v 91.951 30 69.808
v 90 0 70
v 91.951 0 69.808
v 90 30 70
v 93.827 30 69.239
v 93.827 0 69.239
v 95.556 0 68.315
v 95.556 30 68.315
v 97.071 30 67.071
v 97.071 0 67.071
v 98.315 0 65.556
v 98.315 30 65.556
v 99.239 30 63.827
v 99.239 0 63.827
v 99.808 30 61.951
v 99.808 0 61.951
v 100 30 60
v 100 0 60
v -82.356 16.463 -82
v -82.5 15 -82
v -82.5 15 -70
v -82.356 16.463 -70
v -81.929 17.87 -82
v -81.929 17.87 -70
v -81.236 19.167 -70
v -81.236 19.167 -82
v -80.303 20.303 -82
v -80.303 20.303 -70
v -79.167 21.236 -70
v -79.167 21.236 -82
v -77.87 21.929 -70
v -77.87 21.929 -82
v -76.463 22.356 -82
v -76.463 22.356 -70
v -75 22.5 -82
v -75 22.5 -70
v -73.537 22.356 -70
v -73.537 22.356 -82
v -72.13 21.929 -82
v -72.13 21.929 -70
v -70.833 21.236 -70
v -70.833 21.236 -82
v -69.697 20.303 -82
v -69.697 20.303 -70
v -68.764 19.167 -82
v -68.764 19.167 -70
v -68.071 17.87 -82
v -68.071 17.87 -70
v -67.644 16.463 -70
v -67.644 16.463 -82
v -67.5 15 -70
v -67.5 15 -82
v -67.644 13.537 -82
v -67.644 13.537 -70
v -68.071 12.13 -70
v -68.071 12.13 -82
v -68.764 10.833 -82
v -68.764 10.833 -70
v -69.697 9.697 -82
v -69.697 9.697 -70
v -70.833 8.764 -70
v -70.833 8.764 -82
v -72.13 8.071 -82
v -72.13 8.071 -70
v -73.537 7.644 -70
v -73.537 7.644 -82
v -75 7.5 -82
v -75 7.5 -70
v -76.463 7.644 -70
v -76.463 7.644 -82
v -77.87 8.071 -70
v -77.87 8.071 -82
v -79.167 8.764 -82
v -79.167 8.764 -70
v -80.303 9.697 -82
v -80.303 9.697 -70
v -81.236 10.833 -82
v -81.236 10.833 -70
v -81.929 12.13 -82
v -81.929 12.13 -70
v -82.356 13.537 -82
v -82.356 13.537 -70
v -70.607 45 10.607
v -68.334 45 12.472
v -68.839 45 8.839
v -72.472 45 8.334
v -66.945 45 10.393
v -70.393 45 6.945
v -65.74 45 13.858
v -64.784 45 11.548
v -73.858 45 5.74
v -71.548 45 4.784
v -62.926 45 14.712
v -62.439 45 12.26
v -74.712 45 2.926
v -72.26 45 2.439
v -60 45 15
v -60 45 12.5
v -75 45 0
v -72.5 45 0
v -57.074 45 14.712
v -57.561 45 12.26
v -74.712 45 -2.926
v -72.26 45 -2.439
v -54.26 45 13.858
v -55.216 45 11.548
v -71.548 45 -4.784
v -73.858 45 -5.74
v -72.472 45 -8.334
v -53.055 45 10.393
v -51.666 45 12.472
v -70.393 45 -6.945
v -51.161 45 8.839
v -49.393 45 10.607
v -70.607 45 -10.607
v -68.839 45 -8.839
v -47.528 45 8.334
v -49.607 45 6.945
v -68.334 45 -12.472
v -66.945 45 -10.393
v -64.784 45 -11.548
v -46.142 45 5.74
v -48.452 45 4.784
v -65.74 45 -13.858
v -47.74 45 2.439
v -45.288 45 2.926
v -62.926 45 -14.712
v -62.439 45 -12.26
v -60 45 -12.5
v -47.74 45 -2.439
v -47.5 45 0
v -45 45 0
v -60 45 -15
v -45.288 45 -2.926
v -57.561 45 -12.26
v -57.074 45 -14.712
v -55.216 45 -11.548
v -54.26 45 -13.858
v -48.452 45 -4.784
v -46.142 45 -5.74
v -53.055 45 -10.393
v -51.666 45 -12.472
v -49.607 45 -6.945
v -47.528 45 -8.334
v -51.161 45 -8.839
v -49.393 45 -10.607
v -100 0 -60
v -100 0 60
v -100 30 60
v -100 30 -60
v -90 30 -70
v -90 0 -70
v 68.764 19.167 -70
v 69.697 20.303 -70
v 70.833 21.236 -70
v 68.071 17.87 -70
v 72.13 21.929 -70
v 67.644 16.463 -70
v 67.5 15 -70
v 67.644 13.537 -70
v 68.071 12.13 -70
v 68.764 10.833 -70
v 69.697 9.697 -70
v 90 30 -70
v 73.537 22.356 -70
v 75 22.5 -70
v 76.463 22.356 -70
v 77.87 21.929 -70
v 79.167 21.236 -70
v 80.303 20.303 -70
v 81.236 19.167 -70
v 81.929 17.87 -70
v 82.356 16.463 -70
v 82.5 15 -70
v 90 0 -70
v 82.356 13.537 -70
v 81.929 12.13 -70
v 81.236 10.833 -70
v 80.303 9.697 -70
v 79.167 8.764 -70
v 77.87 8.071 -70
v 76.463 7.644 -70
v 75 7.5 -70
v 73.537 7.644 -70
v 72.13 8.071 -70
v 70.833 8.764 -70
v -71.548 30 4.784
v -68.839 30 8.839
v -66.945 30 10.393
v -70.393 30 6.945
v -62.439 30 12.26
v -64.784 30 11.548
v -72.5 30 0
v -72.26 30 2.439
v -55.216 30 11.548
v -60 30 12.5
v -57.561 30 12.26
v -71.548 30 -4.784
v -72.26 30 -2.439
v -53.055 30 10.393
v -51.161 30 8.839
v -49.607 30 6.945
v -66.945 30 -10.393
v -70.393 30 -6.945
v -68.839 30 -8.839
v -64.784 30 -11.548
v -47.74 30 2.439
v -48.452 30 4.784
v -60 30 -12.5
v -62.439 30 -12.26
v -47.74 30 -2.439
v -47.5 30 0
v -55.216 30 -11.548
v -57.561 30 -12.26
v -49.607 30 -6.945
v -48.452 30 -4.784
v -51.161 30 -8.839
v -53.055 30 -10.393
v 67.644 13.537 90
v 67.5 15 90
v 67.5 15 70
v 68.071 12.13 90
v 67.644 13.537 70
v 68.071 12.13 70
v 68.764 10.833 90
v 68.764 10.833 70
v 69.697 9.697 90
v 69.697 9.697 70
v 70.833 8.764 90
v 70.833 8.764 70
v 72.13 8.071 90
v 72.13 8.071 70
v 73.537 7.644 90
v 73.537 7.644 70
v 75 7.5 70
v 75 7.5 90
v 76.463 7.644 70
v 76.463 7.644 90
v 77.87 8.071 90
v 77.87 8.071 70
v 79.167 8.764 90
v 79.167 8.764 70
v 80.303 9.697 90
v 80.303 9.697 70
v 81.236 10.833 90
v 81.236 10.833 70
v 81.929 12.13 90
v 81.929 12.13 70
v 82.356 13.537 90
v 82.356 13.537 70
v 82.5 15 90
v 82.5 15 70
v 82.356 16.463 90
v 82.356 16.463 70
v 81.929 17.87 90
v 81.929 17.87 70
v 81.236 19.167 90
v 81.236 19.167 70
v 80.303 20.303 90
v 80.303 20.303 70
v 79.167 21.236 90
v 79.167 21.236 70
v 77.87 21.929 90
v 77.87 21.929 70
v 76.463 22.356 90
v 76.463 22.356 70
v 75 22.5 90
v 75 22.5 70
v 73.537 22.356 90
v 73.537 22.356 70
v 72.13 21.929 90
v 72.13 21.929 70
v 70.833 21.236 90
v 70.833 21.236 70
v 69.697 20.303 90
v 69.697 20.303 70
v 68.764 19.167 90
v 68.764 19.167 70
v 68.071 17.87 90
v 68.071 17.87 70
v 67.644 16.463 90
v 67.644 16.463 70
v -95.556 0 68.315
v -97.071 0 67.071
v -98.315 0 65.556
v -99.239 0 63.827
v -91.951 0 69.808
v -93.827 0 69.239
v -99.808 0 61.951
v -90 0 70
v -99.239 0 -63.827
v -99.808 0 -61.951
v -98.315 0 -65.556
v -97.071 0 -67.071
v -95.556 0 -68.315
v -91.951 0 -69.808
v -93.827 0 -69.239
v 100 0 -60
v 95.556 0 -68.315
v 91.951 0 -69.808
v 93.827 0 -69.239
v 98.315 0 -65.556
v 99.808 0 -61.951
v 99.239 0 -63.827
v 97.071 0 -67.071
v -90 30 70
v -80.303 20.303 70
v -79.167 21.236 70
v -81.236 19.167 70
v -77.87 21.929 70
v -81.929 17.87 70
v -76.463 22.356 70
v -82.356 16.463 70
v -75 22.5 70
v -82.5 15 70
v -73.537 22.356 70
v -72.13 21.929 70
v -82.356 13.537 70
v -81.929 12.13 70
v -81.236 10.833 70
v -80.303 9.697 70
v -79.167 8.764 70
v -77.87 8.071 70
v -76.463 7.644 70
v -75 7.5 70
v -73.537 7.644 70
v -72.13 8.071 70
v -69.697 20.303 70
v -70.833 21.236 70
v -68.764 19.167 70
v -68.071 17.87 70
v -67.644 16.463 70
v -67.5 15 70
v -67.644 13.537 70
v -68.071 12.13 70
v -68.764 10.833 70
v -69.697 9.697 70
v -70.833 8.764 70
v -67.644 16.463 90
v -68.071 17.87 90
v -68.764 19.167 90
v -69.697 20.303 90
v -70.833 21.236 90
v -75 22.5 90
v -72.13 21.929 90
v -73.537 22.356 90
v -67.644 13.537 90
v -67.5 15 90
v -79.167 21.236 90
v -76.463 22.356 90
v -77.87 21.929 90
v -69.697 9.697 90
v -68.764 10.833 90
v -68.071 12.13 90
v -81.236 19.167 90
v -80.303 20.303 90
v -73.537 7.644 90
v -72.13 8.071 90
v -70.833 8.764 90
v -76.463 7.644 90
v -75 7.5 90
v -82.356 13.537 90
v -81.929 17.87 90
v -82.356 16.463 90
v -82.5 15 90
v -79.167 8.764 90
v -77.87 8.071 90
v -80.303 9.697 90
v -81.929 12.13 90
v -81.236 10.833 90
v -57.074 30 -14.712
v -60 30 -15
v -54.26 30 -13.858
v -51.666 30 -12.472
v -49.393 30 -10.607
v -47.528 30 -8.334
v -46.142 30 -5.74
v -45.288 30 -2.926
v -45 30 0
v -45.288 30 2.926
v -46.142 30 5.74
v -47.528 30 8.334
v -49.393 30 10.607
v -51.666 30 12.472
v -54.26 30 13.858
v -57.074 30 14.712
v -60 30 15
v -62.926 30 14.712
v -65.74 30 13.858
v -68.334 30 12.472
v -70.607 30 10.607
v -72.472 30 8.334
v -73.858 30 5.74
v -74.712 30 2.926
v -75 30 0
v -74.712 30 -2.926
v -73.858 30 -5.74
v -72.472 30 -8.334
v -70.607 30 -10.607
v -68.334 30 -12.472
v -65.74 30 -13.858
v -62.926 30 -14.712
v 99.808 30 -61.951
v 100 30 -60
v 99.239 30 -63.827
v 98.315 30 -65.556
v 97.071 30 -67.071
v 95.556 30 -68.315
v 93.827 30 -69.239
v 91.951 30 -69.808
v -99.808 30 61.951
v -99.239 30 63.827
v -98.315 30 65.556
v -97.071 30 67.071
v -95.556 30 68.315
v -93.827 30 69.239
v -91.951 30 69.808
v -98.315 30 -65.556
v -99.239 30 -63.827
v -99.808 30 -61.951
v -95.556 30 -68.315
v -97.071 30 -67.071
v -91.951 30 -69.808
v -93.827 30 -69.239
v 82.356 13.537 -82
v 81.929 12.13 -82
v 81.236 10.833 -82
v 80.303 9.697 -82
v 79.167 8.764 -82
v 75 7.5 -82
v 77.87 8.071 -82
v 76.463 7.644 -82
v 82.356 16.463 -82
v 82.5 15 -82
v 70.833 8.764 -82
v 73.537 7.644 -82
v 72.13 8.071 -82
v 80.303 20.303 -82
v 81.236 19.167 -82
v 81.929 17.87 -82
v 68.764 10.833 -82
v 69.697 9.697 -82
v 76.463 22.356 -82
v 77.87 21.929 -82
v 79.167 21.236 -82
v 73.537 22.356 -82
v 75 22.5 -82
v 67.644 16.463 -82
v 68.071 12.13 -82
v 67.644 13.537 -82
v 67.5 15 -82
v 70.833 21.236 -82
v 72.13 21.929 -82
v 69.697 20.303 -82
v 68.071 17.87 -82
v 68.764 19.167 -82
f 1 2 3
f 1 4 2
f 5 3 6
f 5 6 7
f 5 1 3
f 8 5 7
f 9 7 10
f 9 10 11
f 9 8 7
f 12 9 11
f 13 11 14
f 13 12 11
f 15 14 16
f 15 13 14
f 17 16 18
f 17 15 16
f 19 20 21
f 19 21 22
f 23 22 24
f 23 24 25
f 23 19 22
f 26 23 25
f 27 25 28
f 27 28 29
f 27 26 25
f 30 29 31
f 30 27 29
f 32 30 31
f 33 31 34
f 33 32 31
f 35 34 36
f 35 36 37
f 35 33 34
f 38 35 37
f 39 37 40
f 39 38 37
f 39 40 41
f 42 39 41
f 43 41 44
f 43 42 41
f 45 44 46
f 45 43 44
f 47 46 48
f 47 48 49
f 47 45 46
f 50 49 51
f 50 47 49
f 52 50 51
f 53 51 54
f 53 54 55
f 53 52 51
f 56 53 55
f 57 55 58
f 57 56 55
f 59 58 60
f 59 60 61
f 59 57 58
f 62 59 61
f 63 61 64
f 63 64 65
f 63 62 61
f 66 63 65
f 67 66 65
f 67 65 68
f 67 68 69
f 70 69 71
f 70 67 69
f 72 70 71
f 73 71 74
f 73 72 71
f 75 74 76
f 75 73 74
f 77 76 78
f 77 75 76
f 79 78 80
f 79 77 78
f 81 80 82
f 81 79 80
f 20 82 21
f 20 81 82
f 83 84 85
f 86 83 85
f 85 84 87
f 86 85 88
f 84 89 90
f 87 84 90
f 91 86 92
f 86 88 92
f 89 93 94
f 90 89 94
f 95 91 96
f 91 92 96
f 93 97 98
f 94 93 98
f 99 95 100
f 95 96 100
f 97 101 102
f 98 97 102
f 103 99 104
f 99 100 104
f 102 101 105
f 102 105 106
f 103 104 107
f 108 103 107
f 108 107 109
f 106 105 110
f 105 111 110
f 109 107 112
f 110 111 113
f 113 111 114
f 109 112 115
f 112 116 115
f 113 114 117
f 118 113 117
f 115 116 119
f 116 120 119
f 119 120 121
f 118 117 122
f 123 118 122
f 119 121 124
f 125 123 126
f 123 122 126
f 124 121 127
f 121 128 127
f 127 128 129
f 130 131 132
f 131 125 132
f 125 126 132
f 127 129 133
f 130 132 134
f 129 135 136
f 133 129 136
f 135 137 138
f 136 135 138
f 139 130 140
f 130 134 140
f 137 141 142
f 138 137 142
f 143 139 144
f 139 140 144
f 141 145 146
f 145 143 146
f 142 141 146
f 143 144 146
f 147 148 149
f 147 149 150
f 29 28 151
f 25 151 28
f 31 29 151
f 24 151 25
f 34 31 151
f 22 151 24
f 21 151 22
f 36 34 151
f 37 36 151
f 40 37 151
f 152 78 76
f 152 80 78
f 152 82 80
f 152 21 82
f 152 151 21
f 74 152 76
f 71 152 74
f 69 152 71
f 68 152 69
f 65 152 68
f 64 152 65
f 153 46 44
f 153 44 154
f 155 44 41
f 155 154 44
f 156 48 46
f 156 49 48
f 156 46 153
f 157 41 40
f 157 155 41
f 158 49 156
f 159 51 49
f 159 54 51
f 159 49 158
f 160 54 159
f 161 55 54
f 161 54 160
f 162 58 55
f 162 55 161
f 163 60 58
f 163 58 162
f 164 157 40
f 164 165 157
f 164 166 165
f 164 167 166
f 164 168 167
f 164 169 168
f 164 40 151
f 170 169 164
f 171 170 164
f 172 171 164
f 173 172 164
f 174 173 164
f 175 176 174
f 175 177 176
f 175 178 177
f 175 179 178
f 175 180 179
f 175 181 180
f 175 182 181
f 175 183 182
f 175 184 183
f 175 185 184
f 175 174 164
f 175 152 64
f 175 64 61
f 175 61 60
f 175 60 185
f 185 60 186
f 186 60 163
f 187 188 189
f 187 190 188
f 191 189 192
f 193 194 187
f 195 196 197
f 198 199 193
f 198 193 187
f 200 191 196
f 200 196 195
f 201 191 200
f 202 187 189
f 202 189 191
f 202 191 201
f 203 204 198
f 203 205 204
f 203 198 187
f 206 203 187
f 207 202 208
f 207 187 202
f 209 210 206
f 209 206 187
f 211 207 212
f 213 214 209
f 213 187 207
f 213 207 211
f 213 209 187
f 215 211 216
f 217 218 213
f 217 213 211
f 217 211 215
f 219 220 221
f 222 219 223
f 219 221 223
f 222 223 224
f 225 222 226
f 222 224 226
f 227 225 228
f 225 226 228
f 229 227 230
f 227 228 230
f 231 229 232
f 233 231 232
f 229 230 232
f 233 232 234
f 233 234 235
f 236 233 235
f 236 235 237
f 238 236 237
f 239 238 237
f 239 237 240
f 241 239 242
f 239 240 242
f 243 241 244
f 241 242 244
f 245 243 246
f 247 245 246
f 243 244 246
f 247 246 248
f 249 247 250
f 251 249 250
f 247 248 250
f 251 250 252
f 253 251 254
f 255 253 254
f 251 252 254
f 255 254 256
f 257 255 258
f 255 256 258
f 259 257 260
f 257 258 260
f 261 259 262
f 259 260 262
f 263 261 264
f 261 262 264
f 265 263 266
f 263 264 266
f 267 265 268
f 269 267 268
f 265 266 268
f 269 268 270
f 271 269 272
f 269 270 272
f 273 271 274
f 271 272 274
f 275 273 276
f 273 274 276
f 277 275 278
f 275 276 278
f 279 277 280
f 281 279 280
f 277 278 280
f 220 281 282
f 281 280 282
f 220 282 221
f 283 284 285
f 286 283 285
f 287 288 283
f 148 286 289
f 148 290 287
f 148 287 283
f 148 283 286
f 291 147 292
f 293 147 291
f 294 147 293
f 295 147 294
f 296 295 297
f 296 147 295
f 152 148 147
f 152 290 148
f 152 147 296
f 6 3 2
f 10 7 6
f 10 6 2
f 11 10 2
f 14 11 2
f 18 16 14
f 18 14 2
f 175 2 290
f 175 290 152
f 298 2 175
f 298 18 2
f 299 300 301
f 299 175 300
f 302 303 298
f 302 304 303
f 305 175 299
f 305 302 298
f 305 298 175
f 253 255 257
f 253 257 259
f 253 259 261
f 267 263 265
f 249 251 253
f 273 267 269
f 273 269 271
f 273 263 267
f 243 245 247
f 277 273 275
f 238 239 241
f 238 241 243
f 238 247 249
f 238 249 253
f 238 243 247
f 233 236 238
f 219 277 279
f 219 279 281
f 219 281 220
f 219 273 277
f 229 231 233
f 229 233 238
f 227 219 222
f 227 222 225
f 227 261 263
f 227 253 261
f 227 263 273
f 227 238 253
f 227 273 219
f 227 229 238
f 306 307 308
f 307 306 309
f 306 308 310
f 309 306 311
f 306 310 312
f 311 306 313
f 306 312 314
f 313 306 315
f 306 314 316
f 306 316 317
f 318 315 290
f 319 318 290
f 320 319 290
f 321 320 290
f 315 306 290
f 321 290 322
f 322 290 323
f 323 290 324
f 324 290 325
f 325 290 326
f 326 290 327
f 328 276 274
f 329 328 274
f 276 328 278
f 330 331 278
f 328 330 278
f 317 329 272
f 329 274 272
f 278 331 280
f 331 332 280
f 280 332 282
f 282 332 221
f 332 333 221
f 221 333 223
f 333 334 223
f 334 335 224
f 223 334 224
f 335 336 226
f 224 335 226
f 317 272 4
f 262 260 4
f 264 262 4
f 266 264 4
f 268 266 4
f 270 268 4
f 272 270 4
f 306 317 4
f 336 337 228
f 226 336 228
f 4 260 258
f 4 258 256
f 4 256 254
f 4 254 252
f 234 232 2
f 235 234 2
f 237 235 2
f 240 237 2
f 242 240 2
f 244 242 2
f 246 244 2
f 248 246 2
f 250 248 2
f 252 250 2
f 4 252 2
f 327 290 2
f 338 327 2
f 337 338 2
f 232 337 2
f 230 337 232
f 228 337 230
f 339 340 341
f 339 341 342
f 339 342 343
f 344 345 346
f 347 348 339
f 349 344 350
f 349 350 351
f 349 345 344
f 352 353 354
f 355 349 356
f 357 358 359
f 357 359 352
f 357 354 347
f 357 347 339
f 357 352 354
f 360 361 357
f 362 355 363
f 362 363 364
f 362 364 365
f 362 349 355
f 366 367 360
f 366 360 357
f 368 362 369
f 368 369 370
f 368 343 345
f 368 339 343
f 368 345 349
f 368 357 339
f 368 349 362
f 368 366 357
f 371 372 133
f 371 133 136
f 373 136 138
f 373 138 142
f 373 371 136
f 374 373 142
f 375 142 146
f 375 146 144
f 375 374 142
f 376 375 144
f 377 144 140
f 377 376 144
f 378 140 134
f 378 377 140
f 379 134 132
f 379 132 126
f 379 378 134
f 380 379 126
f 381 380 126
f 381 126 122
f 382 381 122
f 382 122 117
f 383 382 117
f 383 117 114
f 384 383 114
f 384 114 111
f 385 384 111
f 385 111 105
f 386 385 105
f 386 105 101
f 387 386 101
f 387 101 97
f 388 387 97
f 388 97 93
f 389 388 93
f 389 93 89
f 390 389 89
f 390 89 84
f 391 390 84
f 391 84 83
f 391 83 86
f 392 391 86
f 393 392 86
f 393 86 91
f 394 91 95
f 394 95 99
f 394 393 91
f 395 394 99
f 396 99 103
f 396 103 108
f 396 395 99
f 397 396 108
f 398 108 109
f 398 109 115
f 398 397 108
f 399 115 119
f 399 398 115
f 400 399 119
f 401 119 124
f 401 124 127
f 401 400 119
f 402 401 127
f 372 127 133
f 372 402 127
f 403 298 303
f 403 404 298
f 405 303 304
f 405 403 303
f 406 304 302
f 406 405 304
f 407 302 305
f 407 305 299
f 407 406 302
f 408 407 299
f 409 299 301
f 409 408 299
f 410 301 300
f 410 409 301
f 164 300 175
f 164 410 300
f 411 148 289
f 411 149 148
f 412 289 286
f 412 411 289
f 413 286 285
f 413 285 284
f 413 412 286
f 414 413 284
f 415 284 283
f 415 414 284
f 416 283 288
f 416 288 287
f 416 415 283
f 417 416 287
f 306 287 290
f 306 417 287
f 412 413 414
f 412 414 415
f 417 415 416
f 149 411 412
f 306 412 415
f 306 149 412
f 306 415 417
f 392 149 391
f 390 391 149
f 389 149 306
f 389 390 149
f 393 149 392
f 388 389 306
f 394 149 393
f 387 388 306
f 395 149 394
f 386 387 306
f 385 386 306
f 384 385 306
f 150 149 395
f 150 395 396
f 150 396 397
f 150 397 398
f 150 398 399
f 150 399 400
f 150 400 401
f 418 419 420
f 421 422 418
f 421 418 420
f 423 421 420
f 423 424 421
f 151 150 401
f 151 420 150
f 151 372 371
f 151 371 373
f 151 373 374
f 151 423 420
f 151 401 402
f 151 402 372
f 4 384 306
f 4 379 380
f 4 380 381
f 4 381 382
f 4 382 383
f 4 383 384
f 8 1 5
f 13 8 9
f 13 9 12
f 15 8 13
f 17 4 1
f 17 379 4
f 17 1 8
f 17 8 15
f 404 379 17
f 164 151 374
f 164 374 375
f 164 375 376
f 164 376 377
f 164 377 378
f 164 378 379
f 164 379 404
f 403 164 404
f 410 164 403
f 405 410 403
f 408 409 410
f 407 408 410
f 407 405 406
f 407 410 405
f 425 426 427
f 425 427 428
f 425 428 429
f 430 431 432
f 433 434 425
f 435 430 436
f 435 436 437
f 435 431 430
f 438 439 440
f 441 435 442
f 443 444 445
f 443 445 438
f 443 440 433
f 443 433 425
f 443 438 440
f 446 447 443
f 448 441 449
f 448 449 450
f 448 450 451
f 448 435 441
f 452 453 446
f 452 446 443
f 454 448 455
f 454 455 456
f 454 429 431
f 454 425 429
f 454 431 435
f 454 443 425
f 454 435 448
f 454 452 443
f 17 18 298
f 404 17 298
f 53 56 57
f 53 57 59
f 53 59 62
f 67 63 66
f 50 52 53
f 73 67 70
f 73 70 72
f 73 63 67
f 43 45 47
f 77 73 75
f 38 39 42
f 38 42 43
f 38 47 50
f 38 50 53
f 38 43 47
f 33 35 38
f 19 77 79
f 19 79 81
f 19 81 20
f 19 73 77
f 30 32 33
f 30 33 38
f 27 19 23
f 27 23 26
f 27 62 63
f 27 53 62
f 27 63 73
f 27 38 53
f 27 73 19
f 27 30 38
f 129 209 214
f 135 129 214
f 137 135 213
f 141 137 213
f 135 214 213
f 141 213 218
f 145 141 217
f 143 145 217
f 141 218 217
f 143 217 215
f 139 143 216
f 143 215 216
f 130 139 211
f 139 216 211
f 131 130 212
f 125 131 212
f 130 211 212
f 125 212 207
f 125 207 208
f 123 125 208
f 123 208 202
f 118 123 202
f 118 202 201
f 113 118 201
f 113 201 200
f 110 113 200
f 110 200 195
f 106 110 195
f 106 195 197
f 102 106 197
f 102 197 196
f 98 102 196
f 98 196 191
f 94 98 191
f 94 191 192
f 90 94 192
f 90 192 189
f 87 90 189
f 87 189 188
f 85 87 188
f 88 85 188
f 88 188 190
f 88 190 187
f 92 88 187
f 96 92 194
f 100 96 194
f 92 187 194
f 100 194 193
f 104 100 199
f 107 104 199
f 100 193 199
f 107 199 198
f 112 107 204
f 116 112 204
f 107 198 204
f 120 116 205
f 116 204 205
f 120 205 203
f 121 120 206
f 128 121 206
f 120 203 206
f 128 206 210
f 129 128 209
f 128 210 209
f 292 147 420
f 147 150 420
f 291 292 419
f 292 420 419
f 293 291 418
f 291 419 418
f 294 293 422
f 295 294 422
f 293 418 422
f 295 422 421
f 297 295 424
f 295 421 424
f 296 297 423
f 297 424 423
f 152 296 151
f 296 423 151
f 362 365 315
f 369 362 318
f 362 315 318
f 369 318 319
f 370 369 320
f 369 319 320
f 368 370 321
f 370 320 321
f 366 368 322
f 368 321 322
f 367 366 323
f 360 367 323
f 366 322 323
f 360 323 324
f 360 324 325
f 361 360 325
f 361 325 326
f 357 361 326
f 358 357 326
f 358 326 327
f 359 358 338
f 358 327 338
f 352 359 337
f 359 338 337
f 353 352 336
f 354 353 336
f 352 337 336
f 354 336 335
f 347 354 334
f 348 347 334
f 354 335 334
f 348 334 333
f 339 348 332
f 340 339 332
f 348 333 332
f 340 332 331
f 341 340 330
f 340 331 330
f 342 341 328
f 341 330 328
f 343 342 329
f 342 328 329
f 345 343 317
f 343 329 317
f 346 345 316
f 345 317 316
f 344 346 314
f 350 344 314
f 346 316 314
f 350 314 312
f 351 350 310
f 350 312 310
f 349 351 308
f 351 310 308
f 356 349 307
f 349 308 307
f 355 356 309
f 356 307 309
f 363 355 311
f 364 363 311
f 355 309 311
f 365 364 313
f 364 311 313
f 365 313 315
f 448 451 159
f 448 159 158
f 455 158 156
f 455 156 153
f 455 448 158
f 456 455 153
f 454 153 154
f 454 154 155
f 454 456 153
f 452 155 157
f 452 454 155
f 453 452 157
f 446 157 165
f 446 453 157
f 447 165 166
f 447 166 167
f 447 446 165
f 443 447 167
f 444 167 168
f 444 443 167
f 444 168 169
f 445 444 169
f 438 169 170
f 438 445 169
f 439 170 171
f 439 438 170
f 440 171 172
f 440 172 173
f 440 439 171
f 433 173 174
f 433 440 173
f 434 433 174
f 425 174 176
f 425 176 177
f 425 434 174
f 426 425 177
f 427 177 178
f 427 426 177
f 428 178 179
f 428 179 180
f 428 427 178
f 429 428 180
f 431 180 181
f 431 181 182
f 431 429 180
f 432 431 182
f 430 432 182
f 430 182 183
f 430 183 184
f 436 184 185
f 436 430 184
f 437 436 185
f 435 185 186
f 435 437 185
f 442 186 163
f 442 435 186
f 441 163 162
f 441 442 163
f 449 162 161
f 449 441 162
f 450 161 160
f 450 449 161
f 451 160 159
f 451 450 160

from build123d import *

# Parameters (mm, degrees)
SKETCH1_W           = 200
SKETCH1_H           = 140
BOSS_EXTRUDE1_DEPTH = 30
FILLET1_R           = 10
SKETCH2_R           = 7.5
BOSS_EXTRUDE2_DEPTH = 20
BOSS_EXTRUDE3_START = 12
SKETCH4_R           = 7.5
BOSS_EXTRUDE3_DEPTH = 12
SKETCH6_R           = 15
SKETCH6_R_2         = 12.5
BOSS_EXTRUDE4_DEPTH = 45


with BuildPart() as part:
    # Sketch1 → Boss-Extrude1 (new body)
    with BuildSketch(Plane(origin=(0, 0, 0), x_dir=(1, 0, 0), z_dir=(0, 1, 0))):
        Rectangle(SKETCH1_W, SKETCH1_H)
    extrude(amount=BOSS_EXTRUDE1_DEPTH)

    # Fillet1
    fillet1_edges = [part.edges().sort_by_distance(p)[0] for p in [
        (100, 15, 70),
        (-100, 15, 70),
        (-100, 15, -70),
        (100, 15, -70),
    ]]
    fillet(fillet1_edges, radius=FILLET1_R)

    # Sketch2 → Boss-Extrude2 (add)
    with BuildSketch(Plane.XY.offset(70)):
        with Locations(Location((-75, 15, 0), (0, 0, 180))):
            Circle(SKETCH2_R)
        with Locations(Location((75, 15, 0), (0, 0, 180))):
            Circle(SKETCH2_R)
    extrude(amount=BOSS_EXTRUDE2_DEPTH)

    # Sketch4 → Boss-Extrude3 (add)
    with BuildSketch(Plane(origin=(0, 0, -70), x_dir=(-1, 0, 0), z_dir=(0, 0, -1)).offset(BOSS_EXTRUDE3_START)):
        with Locations((-75, 15)):
            Circle(SKETCH4_R)
        with Locations((75, 15)):
            Circle(SKETCH4_R)
    extrude(amount=-BOSS_EXTRUDE3_DEPTH)

    # Sketch6 → Boss-Extrude4 (add)
    with BuildSketch(Plane.XZ):
        with Locations(Location((-60, 0, 0), (0, 0, 270))):
            Circle(SKETCH6_R)
        with Locations(Location((-60, 0, 0), (0, 0, 270))):
            Circle(SKETCH6_R_2, mode=Mode.SUBTRACT)
    extrude(amount=-BOSS_EXTRUDE4_DEPTH)


solid = part.part
